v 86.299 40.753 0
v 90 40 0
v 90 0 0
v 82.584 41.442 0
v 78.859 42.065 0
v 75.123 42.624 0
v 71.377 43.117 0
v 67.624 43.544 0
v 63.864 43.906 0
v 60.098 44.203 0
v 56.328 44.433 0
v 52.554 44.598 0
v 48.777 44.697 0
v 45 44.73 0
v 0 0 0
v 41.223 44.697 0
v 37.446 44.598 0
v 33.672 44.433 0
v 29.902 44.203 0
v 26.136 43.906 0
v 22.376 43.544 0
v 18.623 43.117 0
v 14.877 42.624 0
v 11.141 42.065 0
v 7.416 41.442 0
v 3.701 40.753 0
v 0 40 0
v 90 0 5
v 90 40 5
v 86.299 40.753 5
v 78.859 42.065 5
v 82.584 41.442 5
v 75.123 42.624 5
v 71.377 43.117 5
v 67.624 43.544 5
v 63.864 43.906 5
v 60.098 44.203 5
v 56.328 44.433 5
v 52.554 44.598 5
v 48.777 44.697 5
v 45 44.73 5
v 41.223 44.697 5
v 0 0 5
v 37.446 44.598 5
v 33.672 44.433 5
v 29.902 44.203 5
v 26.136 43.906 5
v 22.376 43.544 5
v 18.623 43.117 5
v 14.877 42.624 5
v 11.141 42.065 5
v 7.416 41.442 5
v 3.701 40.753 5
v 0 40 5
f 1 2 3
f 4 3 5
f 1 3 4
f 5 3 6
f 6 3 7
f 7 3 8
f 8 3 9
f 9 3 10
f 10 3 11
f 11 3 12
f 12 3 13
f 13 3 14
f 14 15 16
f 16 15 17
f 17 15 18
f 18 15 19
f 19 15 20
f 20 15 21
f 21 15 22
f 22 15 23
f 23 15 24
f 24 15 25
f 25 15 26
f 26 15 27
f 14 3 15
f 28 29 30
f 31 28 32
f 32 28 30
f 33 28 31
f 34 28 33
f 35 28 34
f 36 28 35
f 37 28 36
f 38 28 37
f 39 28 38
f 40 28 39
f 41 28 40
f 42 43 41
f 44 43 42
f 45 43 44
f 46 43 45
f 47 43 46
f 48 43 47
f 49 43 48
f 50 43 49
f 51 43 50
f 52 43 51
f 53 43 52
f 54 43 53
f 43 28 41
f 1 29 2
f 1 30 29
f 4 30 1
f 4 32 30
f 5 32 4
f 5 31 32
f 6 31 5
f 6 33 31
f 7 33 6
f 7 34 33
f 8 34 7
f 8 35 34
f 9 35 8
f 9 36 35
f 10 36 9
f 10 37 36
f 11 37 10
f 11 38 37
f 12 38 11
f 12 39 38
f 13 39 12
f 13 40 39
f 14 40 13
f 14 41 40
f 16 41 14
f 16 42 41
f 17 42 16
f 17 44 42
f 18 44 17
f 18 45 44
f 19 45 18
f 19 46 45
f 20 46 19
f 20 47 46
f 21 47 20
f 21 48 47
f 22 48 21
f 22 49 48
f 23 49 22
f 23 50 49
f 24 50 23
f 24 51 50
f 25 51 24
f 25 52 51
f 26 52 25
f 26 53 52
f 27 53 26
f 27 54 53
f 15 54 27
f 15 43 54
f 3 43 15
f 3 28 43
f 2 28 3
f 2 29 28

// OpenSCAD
$fn = 32;

// ----------------------------------------------------------------------
// Arc profile plate: crown, 27 points
// ----------------------------------------------------------------------

// --- parameters (mm) ---
bar_l = 90;               // bar length, X
bar_w = 40;               // bar height at the ends, Y
arc_r = 216.44;           // radius of the crown arc
arc_angle = 24;           // crown arc angle, degrees
crown_rise = 4.73;        // rise of the crown over the ends
arc_step = 1;             // sampling step of the crown arc, degrees
plate_t = 5;              // plate thickness, Z

bbox_y = bar_w + crown_rise;  // full height with the crown

profile = [[90, 40], [86.299, 40.753], [82.584, 41.442], [78.859, 42.065], [75.123, 42.624], [71.377, 43.117], [67.624, 43.544], [63.864, 43.906], [60.098, 44.203], [56.328, 44.433], [52.554, 44.598], [48.777, 44.697], [45, 44.73], [41.223, 44.697], [37.446, 44.598], [33.672, 44.433], [29.902, 44.203], [26.136, 43.906], [22.376, 43.544], [18.623, 43.117], [14.877, 42.624], [11.141, 42.065], [7.416, 41.442], [3.701, 40.753], [0, 40], [0, 0], [90, 0]];  // primary outline, 27 points, counter clockwise

// --- the one profile operation ---
linear_extrude(height = plate_t) polygon(points = profile);
